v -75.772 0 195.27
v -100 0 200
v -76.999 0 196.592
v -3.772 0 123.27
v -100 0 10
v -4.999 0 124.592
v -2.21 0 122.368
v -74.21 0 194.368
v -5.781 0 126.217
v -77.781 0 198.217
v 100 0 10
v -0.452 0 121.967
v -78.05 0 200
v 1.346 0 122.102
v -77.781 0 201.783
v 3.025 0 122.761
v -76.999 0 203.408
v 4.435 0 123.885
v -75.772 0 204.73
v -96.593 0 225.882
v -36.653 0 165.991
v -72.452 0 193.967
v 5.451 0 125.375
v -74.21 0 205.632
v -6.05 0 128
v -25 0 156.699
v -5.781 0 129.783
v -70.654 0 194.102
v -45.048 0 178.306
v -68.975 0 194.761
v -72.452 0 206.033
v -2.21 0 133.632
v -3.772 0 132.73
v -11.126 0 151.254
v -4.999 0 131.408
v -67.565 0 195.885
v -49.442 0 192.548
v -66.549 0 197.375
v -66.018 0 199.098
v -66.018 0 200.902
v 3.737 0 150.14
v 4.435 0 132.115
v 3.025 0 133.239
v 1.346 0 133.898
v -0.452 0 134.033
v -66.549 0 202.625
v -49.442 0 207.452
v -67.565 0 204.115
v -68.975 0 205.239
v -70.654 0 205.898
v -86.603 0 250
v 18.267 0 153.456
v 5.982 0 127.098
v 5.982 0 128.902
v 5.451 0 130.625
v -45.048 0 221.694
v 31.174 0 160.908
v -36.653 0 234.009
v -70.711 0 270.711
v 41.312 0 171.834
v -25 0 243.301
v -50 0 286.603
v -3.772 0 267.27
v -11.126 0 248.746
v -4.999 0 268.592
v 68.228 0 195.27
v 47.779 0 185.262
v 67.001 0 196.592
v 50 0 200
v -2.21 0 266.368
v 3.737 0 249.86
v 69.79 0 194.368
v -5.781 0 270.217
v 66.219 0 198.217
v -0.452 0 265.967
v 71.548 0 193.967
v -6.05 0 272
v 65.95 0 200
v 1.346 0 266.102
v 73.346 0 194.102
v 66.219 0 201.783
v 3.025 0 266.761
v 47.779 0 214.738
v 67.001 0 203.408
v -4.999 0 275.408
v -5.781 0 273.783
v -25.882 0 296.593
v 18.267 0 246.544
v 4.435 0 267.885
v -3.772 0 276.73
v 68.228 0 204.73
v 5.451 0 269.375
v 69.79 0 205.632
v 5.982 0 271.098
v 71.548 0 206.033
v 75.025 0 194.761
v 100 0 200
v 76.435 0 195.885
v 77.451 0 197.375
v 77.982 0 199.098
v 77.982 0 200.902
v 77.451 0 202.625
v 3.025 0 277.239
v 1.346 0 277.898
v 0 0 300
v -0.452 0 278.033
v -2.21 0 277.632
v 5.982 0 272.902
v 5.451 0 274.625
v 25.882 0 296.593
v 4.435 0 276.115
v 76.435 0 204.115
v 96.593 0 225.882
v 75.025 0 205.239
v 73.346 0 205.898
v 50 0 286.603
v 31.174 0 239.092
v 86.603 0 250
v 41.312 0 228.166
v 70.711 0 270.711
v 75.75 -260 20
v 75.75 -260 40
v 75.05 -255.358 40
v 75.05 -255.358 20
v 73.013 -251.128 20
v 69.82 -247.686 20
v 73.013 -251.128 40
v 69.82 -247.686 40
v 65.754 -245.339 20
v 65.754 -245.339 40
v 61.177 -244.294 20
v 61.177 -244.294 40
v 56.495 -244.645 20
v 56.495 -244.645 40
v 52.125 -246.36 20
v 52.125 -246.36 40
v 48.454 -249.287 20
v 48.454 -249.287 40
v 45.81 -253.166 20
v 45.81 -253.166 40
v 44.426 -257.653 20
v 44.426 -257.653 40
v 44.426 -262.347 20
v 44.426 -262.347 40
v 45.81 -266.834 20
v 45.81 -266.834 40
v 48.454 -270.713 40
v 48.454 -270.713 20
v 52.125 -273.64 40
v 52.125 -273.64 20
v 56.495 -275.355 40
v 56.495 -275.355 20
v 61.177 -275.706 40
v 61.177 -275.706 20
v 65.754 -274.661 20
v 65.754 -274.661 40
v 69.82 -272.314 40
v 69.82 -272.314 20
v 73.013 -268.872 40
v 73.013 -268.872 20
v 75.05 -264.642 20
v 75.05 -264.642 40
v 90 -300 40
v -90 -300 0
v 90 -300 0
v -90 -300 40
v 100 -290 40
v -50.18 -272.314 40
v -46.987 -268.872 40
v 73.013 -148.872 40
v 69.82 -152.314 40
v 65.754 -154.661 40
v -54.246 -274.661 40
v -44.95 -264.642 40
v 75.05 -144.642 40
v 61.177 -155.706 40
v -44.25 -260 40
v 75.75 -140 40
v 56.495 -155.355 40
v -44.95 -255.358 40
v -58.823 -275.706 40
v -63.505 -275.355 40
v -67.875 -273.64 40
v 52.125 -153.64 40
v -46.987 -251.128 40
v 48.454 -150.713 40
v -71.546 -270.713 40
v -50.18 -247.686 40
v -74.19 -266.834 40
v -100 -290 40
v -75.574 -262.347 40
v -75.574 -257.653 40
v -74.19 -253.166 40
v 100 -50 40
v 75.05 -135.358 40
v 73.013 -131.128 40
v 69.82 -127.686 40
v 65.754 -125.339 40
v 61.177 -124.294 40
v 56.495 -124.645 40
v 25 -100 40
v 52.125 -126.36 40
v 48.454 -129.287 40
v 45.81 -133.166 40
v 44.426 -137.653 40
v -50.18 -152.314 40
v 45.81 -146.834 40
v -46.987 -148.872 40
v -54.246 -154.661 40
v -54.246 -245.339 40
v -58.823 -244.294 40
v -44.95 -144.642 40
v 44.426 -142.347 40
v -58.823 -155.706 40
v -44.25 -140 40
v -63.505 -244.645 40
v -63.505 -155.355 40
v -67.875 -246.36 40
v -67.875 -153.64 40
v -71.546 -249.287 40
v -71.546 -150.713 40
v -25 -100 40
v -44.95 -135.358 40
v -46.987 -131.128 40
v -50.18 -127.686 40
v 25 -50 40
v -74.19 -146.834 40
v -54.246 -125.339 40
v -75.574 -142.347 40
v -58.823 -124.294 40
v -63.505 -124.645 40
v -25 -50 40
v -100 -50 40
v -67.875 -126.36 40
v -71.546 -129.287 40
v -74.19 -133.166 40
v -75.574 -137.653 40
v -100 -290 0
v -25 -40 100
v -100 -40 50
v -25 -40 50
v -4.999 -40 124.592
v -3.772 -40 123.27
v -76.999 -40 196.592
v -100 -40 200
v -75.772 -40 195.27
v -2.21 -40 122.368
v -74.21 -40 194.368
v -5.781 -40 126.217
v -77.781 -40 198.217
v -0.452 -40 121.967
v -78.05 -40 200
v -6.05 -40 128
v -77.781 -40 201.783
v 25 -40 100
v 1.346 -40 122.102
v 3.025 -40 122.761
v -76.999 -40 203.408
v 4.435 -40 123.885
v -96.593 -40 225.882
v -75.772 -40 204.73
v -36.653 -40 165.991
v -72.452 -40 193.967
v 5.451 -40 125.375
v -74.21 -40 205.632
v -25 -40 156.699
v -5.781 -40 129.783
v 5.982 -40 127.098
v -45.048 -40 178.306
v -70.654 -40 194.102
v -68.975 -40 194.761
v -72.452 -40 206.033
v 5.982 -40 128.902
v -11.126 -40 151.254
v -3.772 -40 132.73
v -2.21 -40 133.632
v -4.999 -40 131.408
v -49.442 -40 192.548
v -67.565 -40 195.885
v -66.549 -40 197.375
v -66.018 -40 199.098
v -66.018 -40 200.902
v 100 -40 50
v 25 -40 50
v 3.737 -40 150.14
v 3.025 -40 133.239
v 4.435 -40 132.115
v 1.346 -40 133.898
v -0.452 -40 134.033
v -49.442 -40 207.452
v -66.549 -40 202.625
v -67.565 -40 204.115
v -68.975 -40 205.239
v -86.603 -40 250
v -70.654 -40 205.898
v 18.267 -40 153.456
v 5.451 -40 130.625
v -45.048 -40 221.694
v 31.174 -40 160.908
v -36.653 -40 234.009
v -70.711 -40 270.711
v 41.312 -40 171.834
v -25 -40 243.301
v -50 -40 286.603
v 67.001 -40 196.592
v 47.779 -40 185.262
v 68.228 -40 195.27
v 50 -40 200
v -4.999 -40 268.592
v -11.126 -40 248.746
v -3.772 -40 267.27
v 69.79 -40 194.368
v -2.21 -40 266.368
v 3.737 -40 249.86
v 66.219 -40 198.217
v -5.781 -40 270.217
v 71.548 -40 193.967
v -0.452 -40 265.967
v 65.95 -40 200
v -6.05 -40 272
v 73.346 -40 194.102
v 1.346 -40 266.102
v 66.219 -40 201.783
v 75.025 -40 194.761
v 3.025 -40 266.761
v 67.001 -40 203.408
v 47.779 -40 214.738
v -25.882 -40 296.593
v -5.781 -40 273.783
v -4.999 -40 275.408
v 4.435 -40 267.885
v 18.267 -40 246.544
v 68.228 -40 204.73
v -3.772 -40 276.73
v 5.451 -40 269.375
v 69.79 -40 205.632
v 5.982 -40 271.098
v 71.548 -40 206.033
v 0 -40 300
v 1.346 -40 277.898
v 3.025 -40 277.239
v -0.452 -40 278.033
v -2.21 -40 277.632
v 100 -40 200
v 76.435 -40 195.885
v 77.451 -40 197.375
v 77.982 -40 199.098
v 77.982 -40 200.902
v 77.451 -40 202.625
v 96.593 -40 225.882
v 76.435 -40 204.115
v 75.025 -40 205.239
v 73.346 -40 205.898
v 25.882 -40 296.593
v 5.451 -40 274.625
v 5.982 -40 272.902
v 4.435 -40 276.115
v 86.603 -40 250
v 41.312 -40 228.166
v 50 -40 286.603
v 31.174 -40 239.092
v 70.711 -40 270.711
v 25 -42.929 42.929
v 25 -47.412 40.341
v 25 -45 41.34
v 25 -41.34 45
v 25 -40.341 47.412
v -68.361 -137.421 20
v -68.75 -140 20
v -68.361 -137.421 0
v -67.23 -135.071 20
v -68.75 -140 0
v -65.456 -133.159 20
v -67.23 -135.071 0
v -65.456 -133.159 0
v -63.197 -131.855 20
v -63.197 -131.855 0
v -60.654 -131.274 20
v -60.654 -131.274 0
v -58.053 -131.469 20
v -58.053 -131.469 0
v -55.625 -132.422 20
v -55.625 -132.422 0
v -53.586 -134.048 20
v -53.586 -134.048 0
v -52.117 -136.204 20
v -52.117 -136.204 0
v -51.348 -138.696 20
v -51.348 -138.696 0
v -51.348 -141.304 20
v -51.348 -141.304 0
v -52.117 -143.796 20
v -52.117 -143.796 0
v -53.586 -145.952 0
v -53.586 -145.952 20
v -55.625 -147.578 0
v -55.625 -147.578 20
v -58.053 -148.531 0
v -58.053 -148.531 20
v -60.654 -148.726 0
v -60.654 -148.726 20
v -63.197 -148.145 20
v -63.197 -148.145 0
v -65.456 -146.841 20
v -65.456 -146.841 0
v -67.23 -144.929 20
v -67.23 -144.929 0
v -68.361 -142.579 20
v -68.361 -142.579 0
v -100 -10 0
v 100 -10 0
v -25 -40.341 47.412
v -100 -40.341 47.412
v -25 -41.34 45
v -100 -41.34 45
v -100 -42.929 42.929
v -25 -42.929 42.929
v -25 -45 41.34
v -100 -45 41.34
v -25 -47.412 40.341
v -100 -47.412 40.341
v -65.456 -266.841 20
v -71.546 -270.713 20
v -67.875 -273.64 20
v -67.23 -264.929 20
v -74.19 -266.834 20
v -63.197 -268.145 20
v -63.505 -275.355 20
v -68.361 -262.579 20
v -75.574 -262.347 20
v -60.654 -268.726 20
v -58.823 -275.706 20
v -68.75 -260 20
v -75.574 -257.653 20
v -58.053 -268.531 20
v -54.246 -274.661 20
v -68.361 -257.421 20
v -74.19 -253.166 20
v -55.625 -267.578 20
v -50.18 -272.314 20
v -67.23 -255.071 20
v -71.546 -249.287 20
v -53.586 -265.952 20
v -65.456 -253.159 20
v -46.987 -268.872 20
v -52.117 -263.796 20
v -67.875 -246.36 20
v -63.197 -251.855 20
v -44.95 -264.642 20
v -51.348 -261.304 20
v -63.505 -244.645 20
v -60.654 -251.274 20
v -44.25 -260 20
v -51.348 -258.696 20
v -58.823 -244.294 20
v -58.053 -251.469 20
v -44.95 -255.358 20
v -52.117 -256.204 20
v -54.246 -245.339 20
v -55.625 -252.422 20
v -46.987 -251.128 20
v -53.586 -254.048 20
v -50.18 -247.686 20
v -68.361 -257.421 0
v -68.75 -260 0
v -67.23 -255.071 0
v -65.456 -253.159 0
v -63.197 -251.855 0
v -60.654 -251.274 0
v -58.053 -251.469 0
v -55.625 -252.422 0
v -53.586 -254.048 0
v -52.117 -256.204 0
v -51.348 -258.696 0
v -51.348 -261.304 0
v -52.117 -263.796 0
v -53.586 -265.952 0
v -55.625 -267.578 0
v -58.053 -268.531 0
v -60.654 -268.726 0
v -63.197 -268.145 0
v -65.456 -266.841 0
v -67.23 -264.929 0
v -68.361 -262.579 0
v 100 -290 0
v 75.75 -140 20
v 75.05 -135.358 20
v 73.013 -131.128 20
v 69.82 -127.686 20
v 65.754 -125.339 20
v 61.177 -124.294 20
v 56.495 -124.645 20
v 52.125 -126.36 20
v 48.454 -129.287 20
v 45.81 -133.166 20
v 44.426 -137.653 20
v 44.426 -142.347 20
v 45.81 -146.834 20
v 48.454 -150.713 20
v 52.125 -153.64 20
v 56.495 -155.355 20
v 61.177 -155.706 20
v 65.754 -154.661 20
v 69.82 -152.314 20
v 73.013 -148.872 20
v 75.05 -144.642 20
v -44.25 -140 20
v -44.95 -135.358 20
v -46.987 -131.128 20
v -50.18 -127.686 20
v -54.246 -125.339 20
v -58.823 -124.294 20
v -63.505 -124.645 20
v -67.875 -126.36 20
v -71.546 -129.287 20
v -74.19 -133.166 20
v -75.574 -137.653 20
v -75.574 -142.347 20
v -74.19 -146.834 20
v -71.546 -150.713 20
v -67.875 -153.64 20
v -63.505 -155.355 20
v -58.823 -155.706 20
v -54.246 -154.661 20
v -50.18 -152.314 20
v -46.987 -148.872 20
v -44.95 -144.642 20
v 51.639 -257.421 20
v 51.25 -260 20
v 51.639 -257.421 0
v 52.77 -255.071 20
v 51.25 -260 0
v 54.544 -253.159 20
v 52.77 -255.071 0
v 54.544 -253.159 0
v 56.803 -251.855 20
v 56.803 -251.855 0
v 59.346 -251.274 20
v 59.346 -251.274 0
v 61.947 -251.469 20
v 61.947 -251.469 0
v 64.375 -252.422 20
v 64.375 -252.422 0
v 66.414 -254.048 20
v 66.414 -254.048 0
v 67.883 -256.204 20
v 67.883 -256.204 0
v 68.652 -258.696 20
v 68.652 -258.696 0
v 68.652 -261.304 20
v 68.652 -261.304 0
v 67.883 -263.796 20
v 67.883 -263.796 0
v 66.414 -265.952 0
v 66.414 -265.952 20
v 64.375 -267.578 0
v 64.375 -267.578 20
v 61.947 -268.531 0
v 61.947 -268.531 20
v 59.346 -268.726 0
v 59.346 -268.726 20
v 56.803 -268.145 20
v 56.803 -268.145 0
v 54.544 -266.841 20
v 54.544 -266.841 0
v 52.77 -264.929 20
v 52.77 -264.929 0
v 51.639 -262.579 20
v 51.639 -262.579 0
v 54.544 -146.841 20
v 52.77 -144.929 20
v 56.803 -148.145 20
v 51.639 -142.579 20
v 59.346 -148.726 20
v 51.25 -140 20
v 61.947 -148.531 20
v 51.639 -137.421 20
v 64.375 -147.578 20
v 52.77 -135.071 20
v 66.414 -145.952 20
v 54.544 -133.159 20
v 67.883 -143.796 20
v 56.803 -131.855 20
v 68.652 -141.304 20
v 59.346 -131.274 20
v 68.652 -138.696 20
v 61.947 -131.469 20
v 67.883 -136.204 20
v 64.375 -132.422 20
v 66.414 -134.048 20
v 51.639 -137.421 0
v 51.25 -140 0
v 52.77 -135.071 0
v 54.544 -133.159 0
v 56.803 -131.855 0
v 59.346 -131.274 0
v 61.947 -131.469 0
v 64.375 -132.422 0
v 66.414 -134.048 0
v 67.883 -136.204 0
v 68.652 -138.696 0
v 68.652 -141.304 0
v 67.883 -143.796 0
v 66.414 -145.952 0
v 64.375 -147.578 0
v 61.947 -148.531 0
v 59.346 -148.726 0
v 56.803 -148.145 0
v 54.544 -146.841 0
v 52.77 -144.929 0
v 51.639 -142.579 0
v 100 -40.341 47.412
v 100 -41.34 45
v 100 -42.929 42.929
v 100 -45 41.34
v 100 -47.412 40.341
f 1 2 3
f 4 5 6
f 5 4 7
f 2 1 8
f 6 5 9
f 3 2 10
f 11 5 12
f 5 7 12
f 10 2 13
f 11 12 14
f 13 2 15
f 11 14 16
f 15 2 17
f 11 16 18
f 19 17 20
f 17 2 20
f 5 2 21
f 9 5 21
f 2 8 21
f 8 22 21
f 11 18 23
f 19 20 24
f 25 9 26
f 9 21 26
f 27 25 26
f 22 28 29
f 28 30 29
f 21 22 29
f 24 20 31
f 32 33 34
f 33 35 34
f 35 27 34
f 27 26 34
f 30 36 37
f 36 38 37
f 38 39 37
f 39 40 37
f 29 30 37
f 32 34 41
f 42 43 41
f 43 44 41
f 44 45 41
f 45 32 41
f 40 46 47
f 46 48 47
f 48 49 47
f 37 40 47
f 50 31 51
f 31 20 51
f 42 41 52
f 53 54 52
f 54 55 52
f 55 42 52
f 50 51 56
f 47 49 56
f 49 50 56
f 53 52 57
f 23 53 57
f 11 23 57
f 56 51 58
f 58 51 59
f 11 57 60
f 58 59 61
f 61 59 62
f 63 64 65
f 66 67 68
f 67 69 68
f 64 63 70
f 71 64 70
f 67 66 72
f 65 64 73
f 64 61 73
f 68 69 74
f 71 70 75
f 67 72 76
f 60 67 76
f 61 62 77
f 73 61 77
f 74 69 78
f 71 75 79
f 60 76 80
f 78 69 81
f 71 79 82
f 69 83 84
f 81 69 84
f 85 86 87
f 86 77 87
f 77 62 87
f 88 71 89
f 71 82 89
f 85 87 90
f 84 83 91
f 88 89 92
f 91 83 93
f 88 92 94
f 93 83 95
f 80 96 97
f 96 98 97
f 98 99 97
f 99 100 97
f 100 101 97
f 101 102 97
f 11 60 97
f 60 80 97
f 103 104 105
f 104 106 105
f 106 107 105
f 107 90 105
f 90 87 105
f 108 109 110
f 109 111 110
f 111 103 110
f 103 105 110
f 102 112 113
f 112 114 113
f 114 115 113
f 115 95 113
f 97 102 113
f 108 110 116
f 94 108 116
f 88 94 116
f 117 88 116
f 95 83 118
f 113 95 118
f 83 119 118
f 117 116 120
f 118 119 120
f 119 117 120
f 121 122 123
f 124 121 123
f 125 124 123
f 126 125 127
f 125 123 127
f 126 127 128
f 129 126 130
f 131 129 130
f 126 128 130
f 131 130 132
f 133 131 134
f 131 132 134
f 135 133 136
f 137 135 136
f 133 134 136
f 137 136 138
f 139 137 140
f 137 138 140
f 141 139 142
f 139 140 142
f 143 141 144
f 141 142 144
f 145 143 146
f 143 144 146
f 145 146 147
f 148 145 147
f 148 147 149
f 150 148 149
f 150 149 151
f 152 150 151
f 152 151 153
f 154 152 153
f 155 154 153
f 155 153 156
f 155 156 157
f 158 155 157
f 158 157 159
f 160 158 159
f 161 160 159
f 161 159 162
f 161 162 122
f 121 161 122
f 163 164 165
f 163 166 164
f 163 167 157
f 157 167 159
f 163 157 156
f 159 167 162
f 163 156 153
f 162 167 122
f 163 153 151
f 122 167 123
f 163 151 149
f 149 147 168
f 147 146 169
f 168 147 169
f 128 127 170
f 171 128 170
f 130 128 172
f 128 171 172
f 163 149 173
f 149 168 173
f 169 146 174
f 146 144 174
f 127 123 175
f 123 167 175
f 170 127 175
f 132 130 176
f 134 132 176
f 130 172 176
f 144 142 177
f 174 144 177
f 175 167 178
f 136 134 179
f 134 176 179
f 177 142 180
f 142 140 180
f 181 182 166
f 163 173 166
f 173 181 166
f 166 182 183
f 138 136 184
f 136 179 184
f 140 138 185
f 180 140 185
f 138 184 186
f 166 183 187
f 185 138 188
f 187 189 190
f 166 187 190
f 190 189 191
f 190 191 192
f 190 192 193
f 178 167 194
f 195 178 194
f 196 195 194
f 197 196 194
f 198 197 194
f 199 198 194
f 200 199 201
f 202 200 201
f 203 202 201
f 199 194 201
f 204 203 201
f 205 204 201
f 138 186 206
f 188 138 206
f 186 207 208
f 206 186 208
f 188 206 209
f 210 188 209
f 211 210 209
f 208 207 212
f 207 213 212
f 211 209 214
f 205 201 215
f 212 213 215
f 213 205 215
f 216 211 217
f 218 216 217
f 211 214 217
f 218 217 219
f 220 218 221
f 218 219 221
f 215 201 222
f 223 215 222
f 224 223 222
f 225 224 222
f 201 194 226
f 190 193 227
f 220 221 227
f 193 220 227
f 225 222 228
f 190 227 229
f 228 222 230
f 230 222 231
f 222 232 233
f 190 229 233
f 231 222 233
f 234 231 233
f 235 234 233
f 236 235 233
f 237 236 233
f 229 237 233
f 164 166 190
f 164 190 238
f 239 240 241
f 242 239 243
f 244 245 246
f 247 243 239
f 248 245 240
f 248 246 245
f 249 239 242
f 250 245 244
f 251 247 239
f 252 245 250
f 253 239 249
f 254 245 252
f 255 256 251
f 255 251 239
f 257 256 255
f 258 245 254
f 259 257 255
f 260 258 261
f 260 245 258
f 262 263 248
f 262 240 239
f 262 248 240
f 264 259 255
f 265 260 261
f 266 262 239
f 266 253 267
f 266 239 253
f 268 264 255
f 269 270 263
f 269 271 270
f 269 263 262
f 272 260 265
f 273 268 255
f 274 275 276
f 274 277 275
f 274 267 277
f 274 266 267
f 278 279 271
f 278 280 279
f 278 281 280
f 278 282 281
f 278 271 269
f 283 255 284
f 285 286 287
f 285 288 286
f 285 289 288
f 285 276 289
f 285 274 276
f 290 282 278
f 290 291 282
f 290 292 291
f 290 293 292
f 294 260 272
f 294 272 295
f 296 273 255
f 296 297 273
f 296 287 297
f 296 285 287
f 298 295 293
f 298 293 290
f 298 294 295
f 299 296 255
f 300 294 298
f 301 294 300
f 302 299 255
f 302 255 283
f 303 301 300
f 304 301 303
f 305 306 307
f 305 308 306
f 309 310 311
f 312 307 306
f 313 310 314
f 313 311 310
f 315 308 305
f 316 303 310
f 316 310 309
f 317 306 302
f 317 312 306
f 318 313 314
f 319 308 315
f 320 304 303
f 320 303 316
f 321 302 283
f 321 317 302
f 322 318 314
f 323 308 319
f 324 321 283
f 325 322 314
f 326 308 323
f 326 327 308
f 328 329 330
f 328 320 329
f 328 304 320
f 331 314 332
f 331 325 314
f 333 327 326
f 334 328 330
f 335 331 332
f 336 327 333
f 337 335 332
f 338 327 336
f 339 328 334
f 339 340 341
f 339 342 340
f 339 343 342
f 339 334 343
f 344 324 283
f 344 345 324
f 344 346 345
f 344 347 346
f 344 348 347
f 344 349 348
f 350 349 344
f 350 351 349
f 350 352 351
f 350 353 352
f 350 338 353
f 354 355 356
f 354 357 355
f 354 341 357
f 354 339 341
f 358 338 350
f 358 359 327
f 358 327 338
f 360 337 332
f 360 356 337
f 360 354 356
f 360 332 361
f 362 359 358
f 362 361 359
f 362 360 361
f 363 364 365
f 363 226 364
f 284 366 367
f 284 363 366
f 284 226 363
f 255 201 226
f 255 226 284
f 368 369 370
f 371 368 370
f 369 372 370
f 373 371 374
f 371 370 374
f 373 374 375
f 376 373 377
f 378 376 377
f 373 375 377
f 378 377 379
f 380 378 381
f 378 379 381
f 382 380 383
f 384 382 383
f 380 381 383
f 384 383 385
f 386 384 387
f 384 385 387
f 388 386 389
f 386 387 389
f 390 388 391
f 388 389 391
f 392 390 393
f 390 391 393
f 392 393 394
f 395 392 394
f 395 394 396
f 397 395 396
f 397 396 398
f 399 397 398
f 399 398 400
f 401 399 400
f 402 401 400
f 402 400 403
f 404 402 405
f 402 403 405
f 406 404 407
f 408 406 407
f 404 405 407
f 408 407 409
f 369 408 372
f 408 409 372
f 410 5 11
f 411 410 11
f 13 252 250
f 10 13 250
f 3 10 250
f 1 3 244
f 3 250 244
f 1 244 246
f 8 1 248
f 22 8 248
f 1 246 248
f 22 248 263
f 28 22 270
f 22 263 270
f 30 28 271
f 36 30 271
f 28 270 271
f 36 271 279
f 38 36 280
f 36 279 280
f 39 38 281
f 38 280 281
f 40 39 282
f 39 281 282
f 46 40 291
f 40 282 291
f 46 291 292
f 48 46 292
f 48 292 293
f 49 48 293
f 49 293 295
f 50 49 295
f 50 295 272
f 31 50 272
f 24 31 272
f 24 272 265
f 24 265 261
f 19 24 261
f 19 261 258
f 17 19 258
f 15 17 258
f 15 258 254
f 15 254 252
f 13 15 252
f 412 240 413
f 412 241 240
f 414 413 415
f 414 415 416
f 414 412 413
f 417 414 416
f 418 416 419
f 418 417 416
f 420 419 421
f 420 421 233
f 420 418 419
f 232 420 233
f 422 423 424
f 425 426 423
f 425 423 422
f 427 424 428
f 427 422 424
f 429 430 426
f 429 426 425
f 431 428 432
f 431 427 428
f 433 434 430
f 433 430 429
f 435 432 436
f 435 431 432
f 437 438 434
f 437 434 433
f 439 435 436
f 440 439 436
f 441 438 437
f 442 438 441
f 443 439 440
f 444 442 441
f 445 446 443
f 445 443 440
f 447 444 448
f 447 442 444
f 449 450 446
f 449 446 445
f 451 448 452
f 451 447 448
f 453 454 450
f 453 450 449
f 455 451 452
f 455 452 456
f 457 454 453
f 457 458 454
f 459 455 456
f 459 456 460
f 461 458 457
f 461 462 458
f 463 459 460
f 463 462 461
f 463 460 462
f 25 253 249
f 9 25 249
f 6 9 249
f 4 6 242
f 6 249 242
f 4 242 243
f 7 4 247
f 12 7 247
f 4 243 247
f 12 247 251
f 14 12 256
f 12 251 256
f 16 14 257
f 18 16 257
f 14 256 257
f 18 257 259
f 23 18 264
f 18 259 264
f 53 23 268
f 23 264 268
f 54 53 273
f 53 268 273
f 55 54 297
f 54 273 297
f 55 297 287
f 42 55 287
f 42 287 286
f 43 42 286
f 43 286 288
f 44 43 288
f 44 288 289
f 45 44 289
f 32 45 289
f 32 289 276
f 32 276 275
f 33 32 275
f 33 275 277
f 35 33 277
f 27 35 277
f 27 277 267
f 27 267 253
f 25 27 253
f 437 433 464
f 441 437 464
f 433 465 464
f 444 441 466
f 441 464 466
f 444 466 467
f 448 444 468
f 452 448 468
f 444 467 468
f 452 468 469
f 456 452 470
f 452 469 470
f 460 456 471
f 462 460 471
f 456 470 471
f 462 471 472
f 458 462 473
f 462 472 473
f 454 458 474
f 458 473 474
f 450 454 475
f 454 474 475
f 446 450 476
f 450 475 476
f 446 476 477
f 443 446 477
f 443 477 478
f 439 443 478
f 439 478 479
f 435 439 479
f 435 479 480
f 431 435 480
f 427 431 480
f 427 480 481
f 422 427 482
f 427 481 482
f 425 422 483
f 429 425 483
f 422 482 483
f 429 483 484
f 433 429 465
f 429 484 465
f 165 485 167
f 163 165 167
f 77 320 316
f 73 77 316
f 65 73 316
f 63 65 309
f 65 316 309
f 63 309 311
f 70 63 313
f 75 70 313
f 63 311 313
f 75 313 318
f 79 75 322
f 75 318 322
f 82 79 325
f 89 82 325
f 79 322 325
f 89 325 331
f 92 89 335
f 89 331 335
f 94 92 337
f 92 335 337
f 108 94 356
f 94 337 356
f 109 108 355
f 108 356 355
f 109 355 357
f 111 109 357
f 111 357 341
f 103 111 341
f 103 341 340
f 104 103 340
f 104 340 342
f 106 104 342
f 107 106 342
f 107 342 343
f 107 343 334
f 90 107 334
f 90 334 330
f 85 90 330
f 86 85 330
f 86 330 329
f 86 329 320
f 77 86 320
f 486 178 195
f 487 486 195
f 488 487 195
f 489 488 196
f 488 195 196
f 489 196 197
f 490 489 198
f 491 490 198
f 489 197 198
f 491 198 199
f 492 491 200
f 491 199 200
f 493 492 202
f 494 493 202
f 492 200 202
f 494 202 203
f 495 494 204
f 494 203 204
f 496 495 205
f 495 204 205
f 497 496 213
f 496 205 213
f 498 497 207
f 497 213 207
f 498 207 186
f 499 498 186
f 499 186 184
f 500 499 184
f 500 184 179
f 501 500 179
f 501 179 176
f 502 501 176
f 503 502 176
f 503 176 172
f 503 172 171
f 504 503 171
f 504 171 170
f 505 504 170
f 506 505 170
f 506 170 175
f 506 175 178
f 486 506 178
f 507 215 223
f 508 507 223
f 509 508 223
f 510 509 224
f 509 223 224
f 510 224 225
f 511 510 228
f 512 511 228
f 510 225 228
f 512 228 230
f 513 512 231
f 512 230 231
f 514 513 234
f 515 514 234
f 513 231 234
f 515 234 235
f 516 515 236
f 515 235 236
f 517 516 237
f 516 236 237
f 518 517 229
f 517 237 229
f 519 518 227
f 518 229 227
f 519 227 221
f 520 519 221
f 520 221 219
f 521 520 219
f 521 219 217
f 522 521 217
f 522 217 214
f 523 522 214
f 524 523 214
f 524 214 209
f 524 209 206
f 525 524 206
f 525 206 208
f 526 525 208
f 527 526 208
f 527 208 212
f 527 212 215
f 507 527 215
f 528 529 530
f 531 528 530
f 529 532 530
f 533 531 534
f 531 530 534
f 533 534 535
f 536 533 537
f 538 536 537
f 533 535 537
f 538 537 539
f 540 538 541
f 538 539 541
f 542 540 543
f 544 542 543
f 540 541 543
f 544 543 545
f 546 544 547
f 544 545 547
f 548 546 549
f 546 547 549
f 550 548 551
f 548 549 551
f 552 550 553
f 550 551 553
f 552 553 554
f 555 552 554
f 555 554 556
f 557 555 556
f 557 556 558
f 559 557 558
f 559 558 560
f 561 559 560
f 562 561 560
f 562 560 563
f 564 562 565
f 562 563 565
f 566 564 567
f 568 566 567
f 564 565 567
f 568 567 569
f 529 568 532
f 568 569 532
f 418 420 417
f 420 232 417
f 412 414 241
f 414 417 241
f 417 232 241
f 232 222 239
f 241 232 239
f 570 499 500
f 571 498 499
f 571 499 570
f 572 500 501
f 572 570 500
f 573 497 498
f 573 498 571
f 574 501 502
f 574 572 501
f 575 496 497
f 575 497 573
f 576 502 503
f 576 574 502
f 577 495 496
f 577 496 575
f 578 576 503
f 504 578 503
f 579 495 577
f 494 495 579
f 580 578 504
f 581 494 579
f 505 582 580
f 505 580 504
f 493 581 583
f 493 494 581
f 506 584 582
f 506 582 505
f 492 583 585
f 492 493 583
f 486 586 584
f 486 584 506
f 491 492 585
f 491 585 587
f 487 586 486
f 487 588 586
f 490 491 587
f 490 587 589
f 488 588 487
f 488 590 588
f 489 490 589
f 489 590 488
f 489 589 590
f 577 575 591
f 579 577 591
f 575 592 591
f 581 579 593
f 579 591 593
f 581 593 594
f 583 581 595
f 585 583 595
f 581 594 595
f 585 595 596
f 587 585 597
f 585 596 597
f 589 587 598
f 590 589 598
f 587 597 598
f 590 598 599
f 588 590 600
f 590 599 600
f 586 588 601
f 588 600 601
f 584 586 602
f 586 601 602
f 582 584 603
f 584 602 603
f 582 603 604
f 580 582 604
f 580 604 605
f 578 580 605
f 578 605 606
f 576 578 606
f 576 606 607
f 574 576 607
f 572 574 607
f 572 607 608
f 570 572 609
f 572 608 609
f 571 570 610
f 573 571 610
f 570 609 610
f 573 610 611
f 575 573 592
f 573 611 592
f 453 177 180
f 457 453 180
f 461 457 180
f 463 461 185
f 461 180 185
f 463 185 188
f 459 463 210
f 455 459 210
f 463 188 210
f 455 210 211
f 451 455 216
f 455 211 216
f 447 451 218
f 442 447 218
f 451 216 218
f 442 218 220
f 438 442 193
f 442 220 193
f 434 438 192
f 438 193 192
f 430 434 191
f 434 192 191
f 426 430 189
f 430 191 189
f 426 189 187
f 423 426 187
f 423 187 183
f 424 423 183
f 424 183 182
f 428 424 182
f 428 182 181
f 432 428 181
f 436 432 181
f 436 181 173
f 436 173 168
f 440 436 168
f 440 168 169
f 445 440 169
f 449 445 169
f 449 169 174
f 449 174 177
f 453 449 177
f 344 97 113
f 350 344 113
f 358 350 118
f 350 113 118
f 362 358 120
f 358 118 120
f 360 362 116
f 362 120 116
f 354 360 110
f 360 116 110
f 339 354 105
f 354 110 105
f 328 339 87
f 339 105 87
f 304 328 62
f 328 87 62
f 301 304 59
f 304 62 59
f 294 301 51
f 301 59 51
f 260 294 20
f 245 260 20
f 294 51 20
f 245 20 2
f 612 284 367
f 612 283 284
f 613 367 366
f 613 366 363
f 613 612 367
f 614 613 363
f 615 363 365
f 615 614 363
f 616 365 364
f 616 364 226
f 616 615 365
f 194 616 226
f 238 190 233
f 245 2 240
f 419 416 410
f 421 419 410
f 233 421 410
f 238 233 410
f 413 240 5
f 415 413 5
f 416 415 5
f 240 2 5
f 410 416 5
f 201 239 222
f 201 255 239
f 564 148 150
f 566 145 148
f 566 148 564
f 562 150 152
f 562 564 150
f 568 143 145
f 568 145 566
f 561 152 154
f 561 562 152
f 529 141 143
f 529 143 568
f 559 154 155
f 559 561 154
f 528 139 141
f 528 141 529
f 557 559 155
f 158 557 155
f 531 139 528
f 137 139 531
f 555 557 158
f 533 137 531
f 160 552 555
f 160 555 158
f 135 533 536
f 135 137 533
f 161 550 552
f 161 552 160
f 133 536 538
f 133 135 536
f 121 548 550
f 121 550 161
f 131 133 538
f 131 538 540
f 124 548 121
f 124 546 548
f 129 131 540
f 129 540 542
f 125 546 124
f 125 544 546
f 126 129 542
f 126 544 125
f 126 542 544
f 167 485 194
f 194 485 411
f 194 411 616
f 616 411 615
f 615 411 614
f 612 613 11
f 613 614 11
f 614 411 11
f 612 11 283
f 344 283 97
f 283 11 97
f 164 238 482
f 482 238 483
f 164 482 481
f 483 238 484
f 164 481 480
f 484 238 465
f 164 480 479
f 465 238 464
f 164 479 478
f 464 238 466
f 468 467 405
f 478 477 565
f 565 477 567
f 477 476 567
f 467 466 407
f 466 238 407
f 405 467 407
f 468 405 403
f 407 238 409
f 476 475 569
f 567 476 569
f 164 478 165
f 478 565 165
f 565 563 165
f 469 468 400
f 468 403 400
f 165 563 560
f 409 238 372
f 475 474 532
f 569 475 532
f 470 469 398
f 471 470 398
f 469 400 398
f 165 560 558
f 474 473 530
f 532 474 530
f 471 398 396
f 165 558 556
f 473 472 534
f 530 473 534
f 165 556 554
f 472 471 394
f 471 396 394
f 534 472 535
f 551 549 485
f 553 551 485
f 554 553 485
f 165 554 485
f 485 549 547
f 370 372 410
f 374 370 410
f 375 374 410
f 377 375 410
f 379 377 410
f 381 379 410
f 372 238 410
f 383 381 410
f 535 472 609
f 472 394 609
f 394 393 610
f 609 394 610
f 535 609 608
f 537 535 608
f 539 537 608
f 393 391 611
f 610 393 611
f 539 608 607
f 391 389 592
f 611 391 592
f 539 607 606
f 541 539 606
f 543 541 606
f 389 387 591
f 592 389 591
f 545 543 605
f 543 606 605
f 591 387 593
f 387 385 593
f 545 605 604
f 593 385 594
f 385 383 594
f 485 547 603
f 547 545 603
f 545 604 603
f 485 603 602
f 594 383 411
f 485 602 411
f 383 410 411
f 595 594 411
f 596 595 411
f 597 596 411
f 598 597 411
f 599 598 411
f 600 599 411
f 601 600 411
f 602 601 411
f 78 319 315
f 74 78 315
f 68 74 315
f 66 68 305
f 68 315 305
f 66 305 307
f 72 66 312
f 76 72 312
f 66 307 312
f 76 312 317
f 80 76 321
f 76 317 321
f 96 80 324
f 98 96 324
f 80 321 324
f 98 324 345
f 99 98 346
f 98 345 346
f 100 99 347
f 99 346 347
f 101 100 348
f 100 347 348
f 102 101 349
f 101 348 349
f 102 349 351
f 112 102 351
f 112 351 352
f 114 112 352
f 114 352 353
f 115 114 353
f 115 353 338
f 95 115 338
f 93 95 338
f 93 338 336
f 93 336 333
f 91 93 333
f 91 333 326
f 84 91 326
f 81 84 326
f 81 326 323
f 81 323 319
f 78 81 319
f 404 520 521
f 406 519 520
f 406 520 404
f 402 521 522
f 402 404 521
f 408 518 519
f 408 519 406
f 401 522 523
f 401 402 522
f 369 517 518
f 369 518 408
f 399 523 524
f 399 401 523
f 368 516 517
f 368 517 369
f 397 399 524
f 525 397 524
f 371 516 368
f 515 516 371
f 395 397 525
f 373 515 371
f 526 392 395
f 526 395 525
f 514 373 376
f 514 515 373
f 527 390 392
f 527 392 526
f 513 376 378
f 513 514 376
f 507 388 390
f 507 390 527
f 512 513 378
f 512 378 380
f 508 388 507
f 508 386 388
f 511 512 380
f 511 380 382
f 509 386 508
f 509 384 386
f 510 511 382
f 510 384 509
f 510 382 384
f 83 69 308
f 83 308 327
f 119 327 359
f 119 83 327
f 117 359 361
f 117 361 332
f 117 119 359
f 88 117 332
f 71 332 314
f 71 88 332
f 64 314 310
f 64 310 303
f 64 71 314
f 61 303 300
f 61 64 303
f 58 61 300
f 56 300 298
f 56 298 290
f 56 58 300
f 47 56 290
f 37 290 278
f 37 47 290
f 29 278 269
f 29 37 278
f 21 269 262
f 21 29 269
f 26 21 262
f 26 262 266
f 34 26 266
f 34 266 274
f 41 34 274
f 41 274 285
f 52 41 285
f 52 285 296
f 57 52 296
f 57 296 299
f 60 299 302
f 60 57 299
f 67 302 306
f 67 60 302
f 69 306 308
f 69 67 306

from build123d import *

# Parameters (mm, degrees)
F0_R            = 50
F1_DEPTH        = 40
F2_D            = 12.1
F3_SIZE         = 5
F4_DEPTH        = 300
F6_DEPTH        = 25
F7_SIZE         = 10
F8_R            = 10
F10_D           = 17.5
F10_CBORE_D     = 31.5
F10_CBORE_DEPTH = 20


with BuildPart() as f1:
    # F0 (on Front) → F1 (new body)
    with BuildSketch(Plane.XZ):
        Polygon((-100, 0), (0, 0), (100, 0), (100, 40), (-100, 40), align=None)
        with BuildLine():
            Line((-100, 40), (100, 40))
            Line((100, 40), (100, 200))
            ThreePointArc((100, 200), (0, 100), (-100, 200))
            Line((-100, 200), (-100, 40))
        make_face()
        with BuildLine():
            ThreePointArc((-100, 200), (0, 100), (100, 200))
            ThreePointArc((100, 200), (0, 300), (-100, 200))
        make_face()
        with Locations((0, 200)):
            Circle(F0_R, mode=Mode.SUBTRACT)
    extrude(amount=F1_DEPTH)

    # F2 (through all)
    with Locations(Plane(origin=(0, 0, 0), x_dir=(1, 0, 0), z_dir=(0, 1, 0))):
        with Locations((72, -200), (0, -128), (-72, -200), (0, -272)):
            Hole(F2_D / 2)

    # F3
    f3_edges = [f1.edges().sort_by_distance(p)[0] for p in [
        (-100, -20, 0),
        (100, -20, 0),
    ]]
    chamfer(f3_edges, length=F3_SIZE)

    # F0 (on Front) → F4 (join)
    with BuildSketch(Plane.XZ):
        Polygon((-100, 0), (0, 0), (100, 0), (100, 40), (-100, 40), align=None)
    extrude(amount=F4_DEPTH)

    # F5 (on Right) → F6 (join, symmetric)
    with BuildSketch(Plane.YZ):
        Polygon((-100, 40), (-40, 40), (-40, 100), align=None)
    extrude(amount=F6_DEPTH, both=True)

    # F7
    f7_edges = [f1.edges().sort_by_distance(p)[0] for p in [
        (-100, -300, 20),
        (100, -300, 20),
        (0, 0, 0),
    ]]
    chamfer(f7_edges, length=F7_SIZE)

    # F8
    f8_edges = [f1.edges().sort_by_distance(p)[0] for p in [
        (-62.5, -40, 40),
        (62.5, -40, 40),
    ]]
    fillet(f8_edges, radius=F8_R)

    # F10 (through all)
    with Locations(Plane.XY.offset(40)):
        with Locations((60, -140), (60, -260), (-60, -260), (-60, -140)):
            CounterBoreHole(F10_D / 2, F10_CBORE_D / 2, F10_CBORE_DEPTH)


solid = f1.part
